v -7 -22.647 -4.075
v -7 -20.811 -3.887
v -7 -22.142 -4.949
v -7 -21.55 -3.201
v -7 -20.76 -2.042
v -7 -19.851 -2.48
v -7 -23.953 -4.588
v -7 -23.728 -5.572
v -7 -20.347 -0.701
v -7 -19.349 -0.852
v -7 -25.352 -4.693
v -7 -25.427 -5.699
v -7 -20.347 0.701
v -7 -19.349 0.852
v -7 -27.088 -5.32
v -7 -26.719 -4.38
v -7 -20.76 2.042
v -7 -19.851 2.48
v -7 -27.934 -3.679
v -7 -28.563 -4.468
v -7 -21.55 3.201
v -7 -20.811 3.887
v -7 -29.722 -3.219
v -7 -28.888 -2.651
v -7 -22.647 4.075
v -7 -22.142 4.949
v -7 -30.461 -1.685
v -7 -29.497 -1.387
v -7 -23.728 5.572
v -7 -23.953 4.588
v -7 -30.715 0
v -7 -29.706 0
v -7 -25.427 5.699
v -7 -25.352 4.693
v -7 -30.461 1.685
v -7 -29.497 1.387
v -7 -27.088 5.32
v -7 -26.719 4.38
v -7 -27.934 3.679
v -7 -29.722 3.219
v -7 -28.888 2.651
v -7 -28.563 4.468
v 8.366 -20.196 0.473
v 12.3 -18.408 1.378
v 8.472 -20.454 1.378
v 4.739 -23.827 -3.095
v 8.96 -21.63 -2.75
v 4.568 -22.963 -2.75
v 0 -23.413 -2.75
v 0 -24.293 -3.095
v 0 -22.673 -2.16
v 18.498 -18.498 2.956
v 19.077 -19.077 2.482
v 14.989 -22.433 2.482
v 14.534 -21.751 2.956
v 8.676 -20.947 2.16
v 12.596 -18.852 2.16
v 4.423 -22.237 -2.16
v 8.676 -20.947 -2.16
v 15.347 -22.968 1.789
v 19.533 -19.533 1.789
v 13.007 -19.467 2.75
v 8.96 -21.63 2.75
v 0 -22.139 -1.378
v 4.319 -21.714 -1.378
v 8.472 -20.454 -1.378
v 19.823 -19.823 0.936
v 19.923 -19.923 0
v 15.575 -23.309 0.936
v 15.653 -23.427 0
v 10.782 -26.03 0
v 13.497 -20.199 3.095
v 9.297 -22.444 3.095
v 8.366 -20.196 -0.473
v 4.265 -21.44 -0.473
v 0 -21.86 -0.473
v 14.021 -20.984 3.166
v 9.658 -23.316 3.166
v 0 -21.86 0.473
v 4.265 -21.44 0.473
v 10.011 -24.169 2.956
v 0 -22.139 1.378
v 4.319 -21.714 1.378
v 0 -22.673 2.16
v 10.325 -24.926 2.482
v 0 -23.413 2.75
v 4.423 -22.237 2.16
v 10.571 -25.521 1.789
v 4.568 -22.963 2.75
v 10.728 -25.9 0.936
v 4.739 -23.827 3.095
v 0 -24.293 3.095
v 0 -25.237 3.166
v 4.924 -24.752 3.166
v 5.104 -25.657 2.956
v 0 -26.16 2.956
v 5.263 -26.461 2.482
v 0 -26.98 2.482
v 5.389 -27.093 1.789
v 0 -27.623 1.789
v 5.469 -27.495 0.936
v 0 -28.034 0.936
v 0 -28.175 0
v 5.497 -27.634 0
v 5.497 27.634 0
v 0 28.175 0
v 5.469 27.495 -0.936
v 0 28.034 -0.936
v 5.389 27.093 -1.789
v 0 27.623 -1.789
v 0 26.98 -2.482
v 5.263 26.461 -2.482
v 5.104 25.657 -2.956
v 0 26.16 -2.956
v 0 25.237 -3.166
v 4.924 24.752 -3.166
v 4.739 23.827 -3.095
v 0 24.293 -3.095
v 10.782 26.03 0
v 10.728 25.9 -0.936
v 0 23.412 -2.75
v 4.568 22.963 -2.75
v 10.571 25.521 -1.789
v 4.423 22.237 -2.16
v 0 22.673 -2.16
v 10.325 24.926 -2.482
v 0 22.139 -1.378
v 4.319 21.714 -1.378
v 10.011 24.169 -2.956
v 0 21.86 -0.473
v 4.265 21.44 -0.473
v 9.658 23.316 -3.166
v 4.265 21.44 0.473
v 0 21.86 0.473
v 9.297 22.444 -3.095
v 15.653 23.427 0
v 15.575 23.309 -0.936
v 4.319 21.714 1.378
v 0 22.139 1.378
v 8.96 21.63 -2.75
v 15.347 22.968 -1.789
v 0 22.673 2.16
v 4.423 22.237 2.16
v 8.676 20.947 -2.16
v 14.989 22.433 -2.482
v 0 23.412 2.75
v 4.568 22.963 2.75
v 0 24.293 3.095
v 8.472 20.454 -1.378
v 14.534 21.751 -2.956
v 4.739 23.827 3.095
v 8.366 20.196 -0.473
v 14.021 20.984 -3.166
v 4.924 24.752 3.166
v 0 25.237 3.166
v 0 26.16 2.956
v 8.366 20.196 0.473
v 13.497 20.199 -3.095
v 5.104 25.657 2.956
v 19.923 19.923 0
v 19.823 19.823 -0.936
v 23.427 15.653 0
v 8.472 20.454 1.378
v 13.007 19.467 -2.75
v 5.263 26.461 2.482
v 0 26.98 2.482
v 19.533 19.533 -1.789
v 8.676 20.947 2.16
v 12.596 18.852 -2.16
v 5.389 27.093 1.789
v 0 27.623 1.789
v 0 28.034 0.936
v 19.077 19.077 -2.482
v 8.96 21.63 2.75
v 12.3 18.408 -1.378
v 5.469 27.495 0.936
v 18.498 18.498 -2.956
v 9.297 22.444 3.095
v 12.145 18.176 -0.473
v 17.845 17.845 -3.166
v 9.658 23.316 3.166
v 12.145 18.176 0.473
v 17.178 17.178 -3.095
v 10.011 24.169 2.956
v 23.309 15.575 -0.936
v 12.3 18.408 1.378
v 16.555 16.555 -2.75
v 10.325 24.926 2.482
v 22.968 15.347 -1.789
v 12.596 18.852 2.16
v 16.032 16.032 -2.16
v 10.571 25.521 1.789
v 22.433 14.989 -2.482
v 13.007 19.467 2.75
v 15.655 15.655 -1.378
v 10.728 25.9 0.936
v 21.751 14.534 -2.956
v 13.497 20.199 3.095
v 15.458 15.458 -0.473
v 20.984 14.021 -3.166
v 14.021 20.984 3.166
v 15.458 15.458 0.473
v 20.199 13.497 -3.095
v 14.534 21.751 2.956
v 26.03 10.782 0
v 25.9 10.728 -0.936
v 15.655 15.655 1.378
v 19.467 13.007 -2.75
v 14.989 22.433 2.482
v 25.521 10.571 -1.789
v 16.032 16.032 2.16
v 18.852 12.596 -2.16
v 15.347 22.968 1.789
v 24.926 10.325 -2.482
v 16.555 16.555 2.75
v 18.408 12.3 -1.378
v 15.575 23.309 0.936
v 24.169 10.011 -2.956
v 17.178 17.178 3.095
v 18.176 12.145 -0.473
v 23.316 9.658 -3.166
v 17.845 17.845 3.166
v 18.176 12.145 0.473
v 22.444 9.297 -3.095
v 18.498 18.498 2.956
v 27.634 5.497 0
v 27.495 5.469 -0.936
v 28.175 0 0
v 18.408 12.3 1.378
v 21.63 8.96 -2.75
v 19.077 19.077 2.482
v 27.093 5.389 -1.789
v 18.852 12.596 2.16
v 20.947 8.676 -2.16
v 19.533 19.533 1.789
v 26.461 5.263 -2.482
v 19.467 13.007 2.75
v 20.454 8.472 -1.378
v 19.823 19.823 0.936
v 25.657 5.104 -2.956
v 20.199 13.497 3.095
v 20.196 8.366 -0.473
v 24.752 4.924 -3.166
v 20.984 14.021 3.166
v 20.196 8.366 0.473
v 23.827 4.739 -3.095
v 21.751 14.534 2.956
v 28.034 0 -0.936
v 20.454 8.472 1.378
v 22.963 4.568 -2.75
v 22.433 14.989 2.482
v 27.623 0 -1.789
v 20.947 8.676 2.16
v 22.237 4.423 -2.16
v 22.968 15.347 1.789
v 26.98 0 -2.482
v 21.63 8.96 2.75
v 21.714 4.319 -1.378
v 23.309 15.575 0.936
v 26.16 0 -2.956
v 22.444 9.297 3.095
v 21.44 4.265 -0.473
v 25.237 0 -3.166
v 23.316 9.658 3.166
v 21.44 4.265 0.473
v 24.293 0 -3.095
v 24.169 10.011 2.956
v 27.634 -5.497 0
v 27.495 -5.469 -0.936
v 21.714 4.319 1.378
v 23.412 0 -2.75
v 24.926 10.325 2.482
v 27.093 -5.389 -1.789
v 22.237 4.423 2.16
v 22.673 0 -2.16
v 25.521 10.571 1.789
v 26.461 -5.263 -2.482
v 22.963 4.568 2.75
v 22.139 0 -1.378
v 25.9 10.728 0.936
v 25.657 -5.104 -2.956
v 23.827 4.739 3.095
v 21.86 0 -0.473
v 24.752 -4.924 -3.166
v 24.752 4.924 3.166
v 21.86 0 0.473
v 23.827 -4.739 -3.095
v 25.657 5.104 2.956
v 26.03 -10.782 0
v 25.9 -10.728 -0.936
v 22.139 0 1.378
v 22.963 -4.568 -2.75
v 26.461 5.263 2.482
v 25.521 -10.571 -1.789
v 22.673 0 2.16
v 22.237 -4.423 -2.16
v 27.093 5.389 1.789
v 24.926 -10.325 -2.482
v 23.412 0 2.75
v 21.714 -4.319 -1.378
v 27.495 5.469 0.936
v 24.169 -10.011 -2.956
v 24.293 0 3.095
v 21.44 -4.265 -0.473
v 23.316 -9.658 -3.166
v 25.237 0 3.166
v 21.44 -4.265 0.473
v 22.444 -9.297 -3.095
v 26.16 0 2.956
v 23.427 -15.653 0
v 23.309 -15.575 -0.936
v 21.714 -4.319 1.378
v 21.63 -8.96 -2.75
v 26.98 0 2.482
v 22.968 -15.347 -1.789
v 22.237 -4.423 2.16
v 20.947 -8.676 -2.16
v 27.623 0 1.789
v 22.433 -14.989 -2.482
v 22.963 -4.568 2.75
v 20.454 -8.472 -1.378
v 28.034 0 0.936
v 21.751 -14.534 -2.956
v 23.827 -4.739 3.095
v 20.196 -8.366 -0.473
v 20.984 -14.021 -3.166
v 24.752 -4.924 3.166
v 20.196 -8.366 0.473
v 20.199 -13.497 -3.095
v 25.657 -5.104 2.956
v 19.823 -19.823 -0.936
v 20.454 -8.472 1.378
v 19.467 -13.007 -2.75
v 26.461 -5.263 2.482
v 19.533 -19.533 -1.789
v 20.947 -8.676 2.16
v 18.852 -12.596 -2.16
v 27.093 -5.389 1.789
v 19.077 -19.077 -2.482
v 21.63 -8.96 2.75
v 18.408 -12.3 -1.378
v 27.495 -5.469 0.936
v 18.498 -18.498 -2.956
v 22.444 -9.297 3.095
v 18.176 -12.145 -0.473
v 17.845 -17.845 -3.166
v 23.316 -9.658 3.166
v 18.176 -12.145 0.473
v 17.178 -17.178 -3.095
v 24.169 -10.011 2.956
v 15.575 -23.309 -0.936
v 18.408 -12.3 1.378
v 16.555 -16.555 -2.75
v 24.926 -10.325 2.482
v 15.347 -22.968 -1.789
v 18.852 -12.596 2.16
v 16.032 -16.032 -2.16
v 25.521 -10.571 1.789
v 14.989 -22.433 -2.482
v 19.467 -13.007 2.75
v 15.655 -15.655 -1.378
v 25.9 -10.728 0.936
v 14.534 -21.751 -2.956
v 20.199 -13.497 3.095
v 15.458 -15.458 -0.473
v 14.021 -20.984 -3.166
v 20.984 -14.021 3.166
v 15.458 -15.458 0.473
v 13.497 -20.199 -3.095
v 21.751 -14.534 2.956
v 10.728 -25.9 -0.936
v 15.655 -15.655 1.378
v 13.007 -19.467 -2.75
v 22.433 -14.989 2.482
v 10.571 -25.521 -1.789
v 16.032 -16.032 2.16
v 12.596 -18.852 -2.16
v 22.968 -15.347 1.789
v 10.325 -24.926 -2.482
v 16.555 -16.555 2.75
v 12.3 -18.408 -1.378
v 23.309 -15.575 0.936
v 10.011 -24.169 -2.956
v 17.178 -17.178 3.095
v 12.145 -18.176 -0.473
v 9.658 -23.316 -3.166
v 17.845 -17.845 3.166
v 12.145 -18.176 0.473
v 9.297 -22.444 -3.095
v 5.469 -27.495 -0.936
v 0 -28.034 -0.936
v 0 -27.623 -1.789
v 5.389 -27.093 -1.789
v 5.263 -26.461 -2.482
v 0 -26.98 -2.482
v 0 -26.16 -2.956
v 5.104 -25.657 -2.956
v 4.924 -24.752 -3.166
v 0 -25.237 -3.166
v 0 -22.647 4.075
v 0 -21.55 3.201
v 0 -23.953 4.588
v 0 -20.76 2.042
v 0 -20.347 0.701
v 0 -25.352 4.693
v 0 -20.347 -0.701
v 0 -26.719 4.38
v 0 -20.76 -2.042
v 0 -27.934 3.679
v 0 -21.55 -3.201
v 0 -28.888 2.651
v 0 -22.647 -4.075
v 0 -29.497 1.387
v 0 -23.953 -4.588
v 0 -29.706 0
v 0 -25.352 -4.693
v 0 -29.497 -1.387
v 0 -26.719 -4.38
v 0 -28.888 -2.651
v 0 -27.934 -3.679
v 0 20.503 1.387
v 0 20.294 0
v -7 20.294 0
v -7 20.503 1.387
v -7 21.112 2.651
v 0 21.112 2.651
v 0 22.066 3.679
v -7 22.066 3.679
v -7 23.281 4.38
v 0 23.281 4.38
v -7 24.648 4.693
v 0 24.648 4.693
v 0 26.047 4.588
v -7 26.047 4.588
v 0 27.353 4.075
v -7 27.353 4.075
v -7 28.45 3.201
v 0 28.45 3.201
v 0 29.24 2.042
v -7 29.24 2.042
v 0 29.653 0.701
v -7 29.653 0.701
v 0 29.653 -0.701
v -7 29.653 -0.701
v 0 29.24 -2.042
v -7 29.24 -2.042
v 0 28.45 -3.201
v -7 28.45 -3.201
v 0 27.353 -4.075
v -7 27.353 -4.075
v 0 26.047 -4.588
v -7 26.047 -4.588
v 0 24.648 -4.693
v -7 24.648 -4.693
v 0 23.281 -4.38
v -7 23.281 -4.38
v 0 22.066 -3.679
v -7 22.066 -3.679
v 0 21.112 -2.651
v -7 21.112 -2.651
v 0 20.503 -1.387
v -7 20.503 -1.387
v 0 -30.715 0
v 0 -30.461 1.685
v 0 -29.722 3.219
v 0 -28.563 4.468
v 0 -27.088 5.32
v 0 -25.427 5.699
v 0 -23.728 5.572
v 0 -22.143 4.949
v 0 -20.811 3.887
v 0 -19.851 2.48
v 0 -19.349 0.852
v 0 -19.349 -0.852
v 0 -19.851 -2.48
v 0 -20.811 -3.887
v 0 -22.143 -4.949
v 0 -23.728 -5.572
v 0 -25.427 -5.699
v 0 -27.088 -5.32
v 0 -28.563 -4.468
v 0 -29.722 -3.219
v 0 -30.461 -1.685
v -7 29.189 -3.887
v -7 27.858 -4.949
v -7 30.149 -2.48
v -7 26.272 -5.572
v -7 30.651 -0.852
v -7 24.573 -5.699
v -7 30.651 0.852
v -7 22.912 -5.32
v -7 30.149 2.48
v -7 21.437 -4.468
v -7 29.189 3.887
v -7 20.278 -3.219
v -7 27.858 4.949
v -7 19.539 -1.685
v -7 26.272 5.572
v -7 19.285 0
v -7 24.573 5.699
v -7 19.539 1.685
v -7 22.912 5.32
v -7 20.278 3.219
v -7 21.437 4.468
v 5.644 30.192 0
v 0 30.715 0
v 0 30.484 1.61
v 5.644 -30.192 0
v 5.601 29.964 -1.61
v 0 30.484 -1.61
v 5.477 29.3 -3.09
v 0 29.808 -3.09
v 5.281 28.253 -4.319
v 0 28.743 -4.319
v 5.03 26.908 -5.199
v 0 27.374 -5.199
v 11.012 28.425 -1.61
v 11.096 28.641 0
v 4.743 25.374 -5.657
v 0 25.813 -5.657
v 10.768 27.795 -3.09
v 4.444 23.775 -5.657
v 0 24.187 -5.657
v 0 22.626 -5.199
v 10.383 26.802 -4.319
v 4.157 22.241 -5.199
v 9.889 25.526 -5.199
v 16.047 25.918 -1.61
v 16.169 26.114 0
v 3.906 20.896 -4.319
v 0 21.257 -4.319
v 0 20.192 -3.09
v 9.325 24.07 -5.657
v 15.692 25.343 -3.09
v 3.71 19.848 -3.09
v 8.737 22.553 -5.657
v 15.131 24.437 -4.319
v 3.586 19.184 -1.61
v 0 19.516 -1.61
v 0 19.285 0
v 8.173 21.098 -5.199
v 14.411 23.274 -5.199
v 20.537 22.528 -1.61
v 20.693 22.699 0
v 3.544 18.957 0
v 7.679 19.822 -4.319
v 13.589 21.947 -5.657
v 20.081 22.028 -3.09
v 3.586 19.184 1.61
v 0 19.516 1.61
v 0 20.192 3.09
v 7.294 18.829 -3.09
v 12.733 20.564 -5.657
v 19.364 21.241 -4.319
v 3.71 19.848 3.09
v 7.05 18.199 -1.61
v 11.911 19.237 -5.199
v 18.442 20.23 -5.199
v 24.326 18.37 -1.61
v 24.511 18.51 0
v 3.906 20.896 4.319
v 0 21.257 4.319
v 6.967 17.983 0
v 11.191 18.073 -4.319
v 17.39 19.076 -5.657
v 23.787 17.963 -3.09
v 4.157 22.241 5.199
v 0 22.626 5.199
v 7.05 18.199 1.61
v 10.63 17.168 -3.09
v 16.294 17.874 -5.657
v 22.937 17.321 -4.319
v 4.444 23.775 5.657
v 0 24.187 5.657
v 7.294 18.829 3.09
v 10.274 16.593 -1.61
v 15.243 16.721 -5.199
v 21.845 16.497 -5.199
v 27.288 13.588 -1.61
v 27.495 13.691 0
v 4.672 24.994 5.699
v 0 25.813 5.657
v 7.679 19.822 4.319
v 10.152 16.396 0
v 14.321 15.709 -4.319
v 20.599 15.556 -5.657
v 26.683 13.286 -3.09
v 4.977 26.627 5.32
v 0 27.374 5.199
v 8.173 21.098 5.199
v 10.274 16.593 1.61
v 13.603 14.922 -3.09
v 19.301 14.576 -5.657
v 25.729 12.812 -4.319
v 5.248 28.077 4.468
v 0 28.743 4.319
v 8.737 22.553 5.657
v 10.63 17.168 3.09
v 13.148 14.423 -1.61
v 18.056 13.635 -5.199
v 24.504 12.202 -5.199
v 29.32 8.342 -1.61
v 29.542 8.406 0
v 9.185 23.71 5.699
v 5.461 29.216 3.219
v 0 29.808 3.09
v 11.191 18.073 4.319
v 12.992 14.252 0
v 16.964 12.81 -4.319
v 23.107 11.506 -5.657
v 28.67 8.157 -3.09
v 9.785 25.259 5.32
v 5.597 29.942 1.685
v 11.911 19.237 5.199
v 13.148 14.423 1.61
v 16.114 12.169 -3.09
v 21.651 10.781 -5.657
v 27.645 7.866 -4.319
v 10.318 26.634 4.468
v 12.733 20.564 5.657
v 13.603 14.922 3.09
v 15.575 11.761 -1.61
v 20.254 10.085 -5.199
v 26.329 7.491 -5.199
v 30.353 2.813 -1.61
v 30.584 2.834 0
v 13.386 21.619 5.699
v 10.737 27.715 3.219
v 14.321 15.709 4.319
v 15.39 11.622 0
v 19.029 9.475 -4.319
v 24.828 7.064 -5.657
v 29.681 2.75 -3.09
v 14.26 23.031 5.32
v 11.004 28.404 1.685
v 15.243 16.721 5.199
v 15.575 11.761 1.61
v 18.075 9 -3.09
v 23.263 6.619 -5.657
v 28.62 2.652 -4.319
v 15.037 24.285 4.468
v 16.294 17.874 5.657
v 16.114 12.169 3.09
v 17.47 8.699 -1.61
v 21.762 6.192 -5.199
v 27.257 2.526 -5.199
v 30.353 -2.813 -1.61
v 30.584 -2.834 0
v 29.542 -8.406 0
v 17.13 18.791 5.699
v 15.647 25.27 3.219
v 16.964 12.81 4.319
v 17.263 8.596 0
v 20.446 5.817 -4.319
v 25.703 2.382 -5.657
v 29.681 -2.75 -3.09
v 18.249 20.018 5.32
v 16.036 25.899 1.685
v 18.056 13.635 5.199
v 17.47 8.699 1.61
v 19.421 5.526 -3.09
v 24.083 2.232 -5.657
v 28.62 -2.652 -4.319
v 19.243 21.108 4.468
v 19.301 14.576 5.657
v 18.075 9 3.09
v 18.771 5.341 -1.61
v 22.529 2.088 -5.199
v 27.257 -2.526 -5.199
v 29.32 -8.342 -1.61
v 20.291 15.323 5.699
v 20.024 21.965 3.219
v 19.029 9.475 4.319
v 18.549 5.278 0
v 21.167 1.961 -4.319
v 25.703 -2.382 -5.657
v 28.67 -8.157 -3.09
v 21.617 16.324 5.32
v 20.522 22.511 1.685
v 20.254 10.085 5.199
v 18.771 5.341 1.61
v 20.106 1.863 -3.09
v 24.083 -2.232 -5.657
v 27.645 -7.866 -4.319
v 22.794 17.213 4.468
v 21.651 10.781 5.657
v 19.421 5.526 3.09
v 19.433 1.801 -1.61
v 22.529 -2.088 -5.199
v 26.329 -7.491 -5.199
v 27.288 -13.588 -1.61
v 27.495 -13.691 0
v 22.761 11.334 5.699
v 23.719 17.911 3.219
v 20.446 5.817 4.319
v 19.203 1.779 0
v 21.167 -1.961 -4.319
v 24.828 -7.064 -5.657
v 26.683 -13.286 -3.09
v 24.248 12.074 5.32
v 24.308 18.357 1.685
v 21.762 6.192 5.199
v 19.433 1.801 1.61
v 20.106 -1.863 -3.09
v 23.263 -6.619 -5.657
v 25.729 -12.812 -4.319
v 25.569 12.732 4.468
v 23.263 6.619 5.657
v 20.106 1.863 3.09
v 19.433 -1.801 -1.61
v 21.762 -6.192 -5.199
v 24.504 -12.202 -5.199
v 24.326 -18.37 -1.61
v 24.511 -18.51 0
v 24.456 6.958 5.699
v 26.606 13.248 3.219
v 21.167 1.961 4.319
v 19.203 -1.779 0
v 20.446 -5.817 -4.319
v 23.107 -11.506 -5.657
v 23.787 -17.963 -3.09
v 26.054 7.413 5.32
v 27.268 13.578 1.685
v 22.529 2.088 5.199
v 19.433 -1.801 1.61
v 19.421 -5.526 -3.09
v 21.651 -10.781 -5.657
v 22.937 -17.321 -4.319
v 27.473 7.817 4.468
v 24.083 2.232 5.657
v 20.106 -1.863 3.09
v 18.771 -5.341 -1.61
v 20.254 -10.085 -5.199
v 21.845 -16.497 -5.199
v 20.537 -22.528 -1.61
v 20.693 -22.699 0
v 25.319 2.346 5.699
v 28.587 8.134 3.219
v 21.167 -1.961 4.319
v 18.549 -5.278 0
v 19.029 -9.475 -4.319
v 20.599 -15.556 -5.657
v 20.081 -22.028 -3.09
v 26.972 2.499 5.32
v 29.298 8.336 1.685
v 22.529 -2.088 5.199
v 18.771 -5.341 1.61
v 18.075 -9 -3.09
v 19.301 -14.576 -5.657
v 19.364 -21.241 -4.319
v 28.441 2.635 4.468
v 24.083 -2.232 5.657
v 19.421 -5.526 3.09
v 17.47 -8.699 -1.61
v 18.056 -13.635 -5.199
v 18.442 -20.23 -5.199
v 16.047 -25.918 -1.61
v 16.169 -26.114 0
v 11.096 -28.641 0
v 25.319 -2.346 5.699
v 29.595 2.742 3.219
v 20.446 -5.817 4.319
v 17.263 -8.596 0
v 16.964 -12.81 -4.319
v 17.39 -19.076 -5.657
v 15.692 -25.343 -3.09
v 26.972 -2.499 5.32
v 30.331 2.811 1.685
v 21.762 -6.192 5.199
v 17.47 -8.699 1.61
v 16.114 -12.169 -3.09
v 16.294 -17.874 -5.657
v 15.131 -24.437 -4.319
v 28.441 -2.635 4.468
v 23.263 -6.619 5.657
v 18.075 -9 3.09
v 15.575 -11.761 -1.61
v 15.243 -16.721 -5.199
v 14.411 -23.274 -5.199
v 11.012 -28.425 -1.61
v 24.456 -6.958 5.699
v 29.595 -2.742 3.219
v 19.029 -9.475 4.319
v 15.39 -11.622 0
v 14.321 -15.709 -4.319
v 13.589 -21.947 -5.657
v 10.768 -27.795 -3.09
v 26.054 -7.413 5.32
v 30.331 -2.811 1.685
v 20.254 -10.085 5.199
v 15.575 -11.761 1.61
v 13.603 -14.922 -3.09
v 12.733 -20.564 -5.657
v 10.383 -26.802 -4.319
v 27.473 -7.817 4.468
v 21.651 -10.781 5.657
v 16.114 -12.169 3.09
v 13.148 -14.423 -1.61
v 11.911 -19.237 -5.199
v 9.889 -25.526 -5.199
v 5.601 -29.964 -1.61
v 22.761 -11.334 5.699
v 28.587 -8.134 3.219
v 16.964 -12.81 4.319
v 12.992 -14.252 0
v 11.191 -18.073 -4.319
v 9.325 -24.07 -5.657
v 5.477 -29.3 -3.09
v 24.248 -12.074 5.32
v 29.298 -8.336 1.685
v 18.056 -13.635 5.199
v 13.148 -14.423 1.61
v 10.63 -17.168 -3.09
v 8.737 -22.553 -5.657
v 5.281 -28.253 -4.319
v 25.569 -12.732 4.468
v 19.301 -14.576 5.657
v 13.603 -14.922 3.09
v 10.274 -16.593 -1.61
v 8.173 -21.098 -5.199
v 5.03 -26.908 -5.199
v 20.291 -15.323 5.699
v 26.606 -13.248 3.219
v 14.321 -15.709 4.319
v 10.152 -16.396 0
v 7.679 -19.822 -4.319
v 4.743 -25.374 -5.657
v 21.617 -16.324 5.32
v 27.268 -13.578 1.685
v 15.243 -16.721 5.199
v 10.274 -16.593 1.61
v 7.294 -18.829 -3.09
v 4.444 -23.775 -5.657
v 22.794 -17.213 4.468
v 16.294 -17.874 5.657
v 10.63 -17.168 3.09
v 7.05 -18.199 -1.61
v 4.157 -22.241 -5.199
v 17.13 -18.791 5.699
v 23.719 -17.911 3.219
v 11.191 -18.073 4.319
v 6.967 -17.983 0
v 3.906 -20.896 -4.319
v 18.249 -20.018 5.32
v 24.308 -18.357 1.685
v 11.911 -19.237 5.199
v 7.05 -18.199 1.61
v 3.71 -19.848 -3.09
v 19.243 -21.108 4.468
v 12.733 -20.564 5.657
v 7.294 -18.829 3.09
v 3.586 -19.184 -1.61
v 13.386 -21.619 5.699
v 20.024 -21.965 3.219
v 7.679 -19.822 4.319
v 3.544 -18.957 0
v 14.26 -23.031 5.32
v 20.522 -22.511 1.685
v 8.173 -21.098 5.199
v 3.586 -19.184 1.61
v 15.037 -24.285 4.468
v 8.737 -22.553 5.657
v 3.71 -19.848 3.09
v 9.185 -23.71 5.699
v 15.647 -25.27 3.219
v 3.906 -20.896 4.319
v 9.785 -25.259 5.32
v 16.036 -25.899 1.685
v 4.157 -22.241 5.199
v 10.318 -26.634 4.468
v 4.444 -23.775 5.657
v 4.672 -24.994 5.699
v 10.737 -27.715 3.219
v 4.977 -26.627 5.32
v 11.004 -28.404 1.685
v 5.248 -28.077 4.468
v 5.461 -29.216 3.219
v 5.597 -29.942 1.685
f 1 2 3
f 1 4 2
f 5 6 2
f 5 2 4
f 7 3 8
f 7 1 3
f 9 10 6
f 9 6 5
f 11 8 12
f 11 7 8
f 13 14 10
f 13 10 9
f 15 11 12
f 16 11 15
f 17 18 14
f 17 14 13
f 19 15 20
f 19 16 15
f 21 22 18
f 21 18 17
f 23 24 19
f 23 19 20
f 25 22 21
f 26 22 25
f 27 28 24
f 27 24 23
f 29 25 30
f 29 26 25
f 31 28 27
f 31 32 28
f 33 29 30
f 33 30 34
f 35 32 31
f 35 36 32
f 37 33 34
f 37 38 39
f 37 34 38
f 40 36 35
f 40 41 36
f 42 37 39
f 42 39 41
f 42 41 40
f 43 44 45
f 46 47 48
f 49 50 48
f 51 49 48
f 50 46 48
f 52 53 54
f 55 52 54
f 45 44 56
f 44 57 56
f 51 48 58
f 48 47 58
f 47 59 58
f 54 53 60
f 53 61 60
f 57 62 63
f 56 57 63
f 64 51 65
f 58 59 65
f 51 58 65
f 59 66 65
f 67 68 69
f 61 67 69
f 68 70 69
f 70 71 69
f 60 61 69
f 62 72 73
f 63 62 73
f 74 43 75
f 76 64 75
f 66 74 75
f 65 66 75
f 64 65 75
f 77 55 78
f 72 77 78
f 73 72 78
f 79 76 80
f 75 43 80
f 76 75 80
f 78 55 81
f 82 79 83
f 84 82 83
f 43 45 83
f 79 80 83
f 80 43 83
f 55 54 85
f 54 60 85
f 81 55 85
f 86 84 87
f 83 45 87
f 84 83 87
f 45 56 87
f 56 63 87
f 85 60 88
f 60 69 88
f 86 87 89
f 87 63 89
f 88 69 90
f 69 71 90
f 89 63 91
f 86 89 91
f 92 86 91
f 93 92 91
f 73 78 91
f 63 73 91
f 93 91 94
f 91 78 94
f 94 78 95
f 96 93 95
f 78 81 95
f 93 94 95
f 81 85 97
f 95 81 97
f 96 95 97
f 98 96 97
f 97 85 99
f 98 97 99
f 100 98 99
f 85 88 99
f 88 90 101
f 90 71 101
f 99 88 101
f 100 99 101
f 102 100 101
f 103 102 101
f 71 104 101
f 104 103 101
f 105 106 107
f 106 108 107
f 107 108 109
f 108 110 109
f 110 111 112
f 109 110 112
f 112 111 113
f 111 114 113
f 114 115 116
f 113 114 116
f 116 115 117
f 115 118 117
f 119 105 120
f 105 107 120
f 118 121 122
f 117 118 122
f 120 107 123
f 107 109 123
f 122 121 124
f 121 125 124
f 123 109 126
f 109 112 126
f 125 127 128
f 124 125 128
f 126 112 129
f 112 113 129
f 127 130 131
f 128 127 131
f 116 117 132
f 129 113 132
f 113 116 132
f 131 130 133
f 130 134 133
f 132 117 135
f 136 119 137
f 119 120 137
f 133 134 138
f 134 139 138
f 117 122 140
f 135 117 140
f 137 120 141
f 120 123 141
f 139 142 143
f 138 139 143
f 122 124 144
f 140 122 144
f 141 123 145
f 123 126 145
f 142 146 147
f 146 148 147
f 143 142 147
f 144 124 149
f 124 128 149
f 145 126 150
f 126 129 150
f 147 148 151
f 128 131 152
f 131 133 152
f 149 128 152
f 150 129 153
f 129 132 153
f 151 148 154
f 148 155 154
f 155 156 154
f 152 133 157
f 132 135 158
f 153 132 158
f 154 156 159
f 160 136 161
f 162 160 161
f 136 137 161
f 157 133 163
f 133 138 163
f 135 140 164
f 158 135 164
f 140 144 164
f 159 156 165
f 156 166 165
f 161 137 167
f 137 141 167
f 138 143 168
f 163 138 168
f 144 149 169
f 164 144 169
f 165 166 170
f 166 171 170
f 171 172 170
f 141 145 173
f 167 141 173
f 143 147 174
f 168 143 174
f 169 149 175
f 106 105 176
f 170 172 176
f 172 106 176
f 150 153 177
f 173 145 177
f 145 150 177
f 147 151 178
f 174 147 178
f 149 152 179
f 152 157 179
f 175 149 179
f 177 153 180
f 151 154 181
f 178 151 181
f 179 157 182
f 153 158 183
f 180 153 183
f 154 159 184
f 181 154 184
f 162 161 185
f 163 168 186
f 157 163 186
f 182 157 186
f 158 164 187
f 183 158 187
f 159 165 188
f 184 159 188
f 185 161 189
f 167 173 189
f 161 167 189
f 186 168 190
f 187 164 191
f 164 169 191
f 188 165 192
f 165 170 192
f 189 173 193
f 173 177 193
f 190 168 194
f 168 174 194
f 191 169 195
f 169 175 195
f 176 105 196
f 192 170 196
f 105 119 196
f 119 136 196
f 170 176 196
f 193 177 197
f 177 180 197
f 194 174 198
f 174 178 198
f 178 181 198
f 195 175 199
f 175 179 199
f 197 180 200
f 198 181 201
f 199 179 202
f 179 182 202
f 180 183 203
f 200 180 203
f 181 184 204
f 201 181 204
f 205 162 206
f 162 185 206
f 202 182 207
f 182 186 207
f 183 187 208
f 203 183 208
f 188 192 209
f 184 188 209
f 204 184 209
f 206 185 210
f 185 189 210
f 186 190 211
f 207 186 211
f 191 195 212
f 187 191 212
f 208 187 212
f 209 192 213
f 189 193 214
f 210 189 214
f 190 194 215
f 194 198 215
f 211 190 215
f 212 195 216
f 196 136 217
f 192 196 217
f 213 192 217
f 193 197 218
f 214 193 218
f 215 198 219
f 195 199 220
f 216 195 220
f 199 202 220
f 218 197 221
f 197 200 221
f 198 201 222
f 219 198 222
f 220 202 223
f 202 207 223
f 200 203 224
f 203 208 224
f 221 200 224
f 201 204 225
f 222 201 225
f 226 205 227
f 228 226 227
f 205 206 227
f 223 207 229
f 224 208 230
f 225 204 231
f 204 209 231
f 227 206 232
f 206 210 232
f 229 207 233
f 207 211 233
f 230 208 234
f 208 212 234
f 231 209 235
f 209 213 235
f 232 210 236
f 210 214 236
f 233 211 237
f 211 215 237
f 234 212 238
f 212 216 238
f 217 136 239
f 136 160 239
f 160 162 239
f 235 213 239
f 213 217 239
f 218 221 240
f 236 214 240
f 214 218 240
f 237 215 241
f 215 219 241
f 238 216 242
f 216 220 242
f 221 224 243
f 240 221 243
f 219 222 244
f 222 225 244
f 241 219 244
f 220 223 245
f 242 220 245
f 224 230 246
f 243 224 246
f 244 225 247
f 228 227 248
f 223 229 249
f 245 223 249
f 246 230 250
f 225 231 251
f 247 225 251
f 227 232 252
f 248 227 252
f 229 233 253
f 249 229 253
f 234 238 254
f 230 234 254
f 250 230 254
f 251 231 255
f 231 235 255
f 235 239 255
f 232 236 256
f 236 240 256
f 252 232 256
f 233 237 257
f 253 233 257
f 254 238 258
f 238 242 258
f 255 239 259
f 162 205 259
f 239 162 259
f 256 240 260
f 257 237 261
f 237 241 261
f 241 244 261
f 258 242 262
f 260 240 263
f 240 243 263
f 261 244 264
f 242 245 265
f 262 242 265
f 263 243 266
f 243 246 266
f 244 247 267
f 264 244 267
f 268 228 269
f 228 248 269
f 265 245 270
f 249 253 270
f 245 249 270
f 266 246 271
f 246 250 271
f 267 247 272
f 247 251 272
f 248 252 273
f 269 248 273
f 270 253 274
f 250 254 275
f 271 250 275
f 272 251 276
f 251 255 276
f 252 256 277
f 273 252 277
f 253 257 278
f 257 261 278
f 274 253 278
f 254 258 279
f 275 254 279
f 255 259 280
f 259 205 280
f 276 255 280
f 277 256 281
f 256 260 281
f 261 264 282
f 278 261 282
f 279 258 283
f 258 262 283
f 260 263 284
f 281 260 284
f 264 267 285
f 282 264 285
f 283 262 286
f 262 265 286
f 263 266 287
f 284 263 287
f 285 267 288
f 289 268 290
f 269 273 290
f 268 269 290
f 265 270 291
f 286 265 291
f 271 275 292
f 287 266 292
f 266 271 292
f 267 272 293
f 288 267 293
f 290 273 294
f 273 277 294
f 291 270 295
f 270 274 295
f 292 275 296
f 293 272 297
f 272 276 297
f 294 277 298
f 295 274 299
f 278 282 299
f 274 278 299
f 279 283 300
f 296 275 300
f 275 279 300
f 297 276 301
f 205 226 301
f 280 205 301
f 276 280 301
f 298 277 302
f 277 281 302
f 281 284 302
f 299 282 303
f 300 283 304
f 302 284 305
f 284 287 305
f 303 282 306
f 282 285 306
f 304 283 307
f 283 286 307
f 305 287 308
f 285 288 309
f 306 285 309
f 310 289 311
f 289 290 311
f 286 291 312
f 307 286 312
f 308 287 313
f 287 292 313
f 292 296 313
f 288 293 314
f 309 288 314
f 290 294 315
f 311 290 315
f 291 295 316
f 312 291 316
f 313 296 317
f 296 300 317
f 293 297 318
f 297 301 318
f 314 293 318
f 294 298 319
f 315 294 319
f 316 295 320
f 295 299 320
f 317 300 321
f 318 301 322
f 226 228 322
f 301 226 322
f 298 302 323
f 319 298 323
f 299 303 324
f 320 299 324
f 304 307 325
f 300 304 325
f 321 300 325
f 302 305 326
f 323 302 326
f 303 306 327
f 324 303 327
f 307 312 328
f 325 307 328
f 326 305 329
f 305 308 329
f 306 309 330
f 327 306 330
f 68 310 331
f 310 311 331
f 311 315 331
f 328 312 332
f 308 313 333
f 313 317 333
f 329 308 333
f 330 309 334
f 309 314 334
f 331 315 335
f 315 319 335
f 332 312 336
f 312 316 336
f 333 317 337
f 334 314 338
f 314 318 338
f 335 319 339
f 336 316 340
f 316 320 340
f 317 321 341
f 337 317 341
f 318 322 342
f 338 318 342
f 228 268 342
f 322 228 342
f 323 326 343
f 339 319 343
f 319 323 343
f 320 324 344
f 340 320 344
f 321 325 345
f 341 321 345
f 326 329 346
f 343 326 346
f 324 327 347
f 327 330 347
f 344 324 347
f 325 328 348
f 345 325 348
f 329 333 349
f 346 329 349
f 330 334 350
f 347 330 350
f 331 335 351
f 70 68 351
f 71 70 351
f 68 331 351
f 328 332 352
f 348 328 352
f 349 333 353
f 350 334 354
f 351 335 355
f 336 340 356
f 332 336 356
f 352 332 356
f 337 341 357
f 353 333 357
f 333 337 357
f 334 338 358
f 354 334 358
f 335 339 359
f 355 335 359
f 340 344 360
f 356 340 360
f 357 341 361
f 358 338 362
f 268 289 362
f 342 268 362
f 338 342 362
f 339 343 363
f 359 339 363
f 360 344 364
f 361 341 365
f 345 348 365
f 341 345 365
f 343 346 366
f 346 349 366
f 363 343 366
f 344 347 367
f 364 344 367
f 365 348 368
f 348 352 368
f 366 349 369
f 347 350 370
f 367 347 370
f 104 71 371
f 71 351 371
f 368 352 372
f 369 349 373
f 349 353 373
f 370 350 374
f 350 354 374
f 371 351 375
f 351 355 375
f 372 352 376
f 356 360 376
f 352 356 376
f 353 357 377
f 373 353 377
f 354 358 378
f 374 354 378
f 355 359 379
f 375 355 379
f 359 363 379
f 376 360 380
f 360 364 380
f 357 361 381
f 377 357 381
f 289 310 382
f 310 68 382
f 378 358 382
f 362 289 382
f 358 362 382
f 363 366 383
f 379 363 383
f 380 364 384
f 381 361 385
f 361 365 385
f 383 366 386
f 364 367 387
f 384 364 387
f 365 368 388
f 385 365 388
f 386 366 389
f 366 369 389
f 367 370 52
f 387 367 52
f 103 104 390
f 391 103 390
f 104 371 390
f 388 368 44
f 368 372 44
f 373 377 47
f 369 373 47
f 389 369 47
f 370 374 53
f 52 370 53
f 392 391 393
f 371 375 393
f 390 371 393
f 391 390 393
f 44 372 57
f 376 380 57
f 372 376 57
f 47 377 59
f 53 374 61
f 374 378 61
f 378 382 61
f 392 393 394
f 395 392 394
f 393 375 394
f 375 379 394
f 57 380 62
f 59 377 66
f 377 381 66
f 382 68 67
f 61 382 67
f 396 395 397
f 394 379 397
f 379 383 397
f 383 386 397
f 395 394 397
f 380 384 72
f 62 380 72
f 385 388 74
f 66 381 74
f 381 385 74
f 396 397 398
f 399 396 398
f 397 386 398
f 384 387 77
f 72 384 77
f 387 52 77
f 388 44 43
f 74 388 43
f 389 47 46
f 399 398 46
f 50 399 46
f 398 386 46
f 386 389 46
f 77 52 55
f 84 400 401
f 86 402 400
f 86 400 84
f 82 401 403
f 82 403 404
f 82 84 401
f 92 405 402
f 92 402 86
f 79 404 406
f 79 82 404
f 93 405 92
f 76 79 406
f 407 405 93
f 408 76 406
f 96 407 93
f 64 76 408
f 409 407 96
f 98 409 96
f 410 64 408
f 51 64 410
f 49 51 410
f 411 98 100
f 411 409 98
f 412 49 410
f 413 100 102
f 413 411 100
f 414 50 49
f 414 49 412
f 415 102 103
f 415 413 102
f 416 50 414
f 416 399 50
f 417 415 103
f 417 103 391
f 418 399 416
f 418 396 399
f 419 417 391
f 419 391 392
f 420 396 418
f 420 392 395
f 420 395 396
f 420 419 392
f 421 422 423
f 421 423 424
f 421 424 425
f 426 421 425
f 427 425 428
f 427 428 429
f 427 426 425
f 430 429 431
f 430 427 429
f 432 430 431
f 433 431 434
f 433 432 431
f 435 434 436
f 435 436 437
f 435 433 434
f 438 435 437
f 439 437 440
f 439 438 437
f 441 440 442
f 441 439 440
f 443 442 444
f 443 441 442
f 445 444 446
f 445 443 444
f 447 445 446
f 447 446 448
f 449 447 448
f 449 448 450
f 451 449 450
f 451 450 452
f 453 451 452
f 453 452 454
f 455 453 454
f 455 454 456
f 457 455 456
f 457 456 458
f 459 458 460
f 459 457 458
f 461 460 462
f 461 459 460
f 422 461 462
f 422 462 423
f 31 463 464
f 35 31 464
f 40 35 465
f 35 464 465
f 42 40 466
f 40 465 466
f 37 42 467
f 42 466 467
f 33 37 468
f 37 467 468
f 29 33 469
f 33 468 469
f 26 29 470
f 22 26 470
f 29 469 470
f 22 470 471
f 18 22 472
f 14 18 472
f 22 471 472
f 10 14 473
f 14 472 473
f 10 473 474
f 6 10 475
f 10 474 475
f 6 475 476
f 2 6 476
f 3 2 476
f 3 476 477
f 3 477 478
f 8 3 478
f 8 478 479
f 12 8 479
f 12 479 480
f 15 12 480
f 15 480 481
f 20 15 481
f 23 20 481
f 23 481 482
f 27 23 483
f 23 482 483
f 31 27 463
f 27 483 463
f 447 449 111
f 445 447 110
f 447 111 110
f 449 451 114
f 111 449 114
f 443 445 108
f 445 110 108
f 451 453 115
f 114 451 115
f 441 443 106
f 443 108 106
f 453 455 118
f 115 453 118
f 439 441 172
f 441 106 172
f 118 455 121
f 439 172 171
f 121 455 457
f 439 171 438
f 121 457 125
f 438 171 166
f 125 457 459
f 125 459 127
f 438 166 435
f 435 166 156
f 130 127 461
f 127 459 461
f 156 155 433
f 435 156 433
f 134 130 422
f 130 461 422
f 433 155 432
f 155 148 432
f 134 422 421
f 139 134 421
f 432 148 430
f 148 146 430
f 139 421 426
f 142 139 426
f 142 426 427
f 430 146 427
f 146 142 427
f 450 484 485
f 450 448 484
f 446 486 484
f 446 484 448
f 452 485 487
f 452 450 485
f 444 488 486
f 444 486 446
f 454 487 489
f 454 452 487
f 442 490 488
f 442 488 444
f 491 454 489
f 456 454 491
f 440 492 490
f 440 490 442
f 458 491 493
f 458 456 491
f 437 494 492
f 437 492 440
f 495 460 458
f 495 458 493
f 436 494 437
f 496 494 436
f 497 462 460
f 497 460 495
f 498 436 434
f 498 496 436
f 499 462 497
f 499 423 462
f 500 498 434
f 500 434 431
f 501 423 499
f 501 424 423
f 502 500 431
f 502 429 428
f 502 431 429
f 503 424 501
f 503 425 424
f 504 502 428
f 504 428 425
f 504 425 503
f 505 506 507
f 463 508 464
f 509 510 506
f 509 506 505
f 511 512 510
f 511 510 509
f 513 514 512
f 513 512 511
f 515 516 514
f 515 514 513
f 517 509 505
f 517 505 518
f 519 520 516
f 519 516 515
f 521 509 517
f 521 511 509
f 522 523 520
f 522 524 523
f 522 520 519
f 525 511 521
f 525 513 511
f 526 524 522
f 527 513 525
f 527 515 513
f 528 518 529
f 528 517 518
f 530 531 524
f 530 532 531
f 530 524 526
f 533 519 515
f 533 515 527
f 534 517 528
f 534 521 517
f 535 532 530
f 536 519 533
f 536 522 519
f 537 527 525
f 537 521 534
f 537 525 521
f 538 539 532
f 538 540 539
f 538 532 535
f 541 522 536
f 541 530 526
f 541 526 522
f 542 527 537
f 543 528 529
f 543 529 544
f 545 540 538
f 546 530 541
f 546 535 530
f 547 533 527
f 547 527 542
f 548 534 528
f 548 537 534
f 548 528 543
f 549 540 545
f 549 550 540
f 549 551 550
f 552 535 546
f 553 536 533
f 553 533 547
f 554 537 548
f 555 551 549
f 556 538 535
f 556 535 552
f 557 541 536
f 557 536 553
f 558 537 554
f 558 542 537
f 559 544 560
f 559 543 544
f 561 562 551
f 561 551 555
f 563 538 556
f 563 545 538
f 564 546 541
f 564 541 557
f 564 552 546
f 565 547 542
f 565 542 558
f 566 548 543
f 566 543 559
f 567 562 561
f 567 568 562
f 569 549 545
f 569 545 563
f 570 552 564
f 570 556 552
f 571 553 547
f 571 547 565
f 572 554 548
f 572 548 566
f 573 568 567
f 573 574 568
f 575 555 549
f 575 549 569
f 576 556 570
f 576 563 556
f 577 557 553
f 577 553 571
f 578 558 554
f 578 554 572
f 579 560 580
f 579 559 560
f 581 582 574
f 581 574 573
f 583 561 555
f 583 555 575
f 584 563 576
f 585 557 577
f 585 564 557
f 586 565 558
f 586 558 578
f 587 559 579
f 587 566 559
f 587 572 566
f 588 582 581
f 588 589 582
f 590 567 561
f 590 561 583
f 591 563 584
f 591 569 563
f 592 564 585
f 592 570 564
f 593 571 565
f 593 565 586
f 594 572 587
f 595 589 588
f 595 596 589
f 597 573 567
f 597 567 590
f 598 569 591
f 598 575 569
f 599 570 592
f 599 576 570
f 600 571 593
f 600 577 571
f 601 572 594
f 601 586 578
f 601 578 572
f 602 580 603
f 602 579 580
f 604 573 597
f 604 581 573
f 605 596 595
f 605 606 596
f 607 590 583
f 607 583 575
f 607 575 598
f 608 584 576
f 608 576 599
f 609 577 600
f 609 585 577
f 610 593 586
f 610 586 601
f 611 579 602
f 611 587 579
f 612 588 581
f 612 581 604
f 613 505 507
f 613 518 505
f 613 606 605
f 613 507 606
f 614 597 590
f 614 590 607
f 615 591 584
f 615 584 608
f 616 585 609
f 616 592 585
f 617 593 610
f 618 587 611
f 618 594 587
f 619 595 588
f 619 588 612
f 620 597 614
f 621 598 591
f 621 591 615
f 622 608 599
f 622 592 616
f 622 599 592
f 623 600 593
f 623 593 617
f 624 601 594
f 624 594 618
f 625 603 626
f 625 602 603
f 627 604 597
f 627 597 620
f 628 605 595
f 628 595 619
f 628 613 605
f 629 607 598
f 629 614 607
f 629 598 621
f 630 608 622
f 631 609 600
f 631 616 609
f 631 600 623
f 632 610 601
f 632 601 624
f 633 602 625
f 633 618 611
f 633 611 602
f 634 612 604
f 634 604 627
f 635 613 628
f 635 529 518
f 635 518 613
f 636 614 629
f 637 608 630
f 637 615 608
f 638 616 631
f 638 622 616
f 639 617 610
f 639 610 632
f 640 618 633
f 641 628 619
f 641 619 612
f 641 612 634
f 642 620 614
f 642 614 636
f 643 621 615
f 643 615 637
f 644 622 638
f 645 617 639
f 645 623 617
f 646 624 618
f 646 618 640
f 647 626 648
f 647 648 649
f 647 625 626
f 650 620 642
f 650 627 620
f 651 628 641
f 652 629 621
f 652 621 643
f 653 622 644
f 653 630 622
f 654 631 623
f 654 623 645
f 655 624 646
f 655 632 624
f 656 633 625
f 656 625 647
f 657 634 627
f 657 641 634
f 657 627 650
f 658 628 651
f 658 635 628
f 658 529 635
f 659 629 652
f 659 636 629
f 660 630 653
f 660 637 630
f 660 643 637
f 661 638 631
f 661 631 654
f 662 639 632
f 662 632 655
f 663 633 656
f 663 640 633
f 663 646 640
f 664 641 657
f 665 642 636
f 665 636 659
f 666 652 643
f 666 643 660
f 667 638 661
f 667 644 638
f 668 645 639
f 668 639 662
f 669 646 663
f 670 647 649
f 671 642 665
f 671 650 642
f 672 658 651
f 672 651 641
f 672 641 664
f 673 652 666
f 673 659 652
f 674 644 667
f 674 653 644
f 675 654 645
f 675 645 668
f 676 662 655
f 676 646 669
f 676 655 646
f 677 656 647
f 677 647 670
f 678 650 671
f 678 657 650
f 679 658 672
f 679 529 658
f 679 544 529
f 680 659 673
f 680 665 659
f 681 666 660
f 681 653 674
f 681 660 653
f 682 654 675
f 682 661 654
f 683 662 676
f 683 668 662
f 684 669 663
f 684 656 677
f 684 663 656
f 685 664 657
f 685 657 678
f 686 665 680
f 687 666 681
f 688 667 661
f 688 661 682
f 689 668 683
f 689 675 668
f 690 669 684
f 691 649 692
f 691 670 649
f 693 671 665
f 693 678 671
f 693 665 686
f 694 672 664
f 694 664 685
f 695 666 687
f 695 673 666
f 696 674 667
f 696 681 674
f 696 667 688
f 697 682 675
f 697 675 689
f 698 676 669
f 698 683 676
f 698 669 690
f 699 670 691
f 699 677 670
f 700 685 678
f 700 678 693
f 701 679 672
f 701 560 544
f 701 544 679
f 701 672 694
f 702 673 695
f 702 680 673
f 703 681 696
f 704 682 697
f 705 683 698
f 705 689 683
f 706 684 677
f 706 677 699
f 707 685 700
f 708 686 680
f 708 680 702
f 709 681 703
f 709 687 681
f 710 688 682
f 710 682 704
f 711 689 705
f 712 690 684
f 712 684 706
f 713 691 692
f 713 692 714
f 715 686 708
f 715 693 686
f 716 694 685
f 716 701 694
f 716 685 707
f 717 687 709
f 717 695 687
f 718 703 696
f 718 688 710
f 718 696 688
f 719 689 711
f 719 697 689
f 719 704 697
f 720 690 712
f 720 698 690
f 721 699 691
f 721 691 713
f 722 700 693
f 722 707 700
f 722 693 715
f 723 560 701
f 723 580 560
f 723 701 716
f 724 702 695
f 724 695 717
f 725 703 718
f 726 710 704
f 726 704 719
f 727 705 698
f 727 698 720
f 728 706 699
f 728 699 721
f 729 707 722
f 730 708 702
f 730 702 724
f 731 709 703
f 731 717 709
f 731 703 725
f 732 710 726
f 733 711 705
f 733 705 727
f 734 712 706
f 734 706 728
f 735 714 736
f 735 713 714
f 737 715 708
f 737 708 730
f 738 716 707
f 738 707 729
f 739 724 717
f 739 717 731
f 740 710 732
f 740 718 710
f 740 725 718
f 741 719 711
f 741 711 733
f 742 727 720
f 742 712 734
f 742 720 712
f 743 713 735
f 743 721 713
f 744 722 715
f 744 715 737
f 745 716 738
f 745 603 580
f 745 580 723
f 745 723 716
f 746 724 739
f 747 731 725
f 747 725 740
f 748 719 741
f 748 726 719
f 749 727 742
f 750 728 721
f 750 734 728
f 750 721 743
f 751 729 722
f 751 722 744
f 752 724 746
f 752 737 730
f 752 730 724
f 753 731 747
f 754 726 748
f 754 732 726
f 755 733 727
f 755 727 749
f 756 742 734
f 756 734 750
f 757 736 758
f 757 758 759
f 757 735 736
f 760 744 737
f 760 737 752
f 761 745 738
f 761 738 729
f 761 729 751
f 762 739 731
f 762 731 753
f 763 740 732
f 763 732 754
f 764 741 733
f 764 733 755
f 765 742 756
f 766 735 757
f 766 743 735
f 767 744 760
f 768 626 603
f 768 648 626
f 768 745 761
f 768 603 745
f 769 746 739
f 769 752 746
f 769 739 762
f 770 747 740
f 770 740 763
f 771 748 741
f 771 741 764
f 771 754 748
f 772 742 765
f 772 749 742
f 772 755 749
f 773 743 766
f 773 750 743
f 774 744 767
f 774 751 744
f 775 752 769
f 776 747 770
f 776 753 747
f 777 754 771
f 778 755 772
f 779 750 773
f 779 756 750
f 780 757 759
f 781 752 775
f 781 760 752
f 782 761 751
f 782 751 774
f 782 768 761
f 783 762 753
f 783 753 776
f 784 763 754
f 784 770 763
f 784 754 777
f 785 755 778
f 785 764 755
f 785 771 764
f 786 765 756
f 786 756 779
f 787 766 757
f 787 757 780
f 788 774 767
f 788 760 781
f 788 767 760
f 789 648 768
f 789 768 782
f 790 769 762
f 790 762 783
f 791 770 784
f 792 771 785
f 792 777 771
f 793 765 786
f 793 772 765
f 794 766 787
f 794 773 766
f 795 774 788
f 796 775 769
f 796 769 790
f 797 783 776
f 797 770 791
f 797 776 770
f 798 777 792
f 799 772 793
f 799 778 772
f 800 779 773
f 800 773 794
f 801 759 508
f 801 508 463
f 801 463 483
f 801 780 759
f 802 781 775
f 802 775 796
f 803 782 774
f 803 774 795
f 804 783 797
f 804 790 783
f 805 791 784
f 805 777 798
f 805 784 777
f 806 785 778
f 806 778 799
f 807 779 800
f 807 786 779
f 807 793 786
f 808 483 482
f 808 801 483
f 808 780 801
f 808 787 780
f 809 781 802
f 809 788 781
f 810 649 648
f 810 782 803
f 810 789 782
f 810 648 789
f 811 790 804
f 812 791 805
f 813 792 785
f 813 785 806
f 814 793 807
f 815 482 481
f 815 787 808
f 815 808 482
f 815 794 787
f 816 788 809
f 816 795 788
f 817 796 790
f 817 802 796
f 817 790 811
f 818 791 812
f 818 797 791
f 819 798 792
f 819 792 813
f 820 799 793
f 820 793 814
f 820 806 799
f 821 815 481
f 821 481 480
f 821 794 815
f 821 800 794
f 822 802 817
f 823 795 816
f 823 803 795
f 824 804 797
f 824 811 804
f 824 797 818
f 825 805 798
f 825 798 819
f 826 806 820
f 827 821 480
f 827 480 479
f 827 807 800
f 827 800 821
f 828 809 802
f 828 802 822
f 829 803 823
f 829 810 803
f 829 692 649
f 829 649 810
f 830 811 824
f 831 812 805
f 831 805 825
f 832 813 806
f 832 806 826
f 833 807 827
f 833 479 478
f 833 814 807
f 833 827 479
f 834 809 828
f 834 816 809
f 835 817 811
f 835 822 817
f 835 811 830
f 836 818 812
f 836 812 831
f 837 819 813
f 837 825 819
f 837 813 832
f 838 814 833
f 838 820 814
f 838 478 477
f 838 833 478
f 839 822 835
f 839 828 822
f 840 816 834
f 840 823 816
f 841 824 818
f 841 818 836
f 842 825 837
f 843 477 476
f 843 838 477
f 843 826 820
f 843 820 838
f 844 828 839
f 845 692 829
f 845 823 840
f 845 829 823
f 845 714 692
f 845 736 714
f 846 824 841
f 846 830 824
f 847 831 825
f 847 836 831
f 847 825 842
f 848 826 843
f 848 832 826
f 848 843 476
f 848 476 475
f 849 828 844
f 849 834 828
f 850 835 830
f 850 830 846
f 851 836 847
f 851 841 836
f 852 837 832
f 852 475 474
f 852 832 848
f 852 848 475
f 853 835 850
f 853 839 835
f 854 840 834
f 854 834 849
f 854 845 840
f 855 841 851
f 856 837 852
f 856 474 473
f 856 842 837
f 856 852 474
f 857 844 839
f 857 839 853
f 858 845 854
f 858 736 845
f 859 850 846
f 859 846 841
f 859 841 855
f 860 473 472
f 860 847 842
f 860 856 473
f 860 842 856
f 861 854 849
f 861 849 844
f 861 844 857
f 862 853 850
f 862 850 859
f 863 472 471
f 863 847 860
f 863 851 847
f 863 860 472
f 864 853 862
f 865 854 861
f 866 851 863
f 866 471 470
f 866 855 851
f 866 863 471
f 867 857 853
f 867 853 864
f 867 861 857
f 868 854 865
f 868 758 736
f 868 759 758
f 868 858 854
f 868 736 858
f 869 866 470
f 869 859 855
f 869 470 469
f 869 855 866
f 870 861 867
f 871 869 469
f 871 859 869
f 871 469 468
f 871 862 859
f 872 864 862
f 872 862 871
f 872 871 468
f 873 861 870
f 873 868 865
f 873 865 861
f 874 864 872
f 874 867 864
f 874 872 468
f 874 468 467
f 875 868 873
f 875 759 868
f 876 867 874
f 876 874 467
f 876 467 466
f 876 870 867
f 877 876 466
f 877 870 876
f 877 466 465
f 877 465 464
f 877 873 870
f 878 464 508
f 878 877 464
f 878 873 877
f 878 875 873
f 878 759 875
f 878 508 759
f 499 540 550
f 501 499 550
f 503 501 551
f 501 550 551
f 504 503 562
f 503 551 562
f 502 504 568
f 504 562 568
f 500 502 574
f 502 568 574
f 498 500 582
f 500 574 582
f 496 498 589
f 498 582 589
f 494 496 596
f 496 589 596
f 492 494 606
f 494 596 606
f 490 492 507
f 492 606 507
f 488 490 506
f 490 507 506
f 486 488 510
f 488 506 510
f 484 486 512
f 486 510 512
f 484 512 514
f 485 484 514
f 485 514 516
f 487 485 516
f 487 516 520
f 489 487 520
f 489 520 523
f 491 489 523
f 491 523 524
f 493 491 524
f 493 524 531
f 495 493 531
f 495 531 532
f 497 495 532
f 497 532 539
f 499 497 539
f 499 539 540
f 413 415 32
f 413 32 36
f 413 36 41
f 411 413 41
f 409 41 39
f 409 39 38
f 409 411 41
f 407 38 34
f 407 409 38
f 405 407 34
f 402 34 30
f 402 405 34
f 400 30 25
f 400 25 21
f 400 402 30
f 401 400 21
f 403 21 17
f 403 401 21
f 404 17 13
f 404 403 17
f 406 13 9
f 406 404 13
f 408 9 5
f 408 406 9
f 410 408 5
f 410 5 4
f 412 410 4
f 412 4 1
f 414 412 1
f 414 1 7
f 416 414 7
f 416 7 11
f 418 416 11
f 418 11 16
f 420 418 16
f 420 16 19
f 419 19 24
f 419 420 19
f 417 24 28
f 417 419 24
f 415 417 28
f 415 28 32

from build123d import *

# Parameters (mm, degrees)
F1_R     = 5.715
F1_R_2   = 3.175
F3_R     = 5.715
F3_R_2   = 4.70576
F4_DEPTH = 7


with BuildPart() as f2:
    # F2: sweep along a path in F0
    with BuildLine(Plane.XY) as f2_path:
        ThreePointArc((0, 25), (25, 0), (0, -25))
    # F1 (on Right) → F2 (sweep)
    with BuildSketch(Plane.YZ):
        with Locations((25, 0)):
            Circle(F1_R)
        with Locations((25, 0)):
            Circle(F1_R_2, mode=Mode.SUBTRACT)
    sweep(path=f2_path.line)

    # F3 (on face) → F4 (join)
    with BuildSketch(Plane(origin=(0, 0, 0), x_dir=(0, -1, 0), z_dir=(-1, 0, 0))):
        with Locations((25, 0)):
            Circle(F3_R)
        with Locations((25, 0)):
            Circle(F3_R_2, mode=Mode.SUBTRACT)
        with Locations((-25, 0)):
            Circle(F3_R)
        with Locations((-25, 0)):
            Circle(F3_R_2, mode=Mode.SUBTRACT)
    extrude(amount=F4_DEPTH)


solid = f2.part
